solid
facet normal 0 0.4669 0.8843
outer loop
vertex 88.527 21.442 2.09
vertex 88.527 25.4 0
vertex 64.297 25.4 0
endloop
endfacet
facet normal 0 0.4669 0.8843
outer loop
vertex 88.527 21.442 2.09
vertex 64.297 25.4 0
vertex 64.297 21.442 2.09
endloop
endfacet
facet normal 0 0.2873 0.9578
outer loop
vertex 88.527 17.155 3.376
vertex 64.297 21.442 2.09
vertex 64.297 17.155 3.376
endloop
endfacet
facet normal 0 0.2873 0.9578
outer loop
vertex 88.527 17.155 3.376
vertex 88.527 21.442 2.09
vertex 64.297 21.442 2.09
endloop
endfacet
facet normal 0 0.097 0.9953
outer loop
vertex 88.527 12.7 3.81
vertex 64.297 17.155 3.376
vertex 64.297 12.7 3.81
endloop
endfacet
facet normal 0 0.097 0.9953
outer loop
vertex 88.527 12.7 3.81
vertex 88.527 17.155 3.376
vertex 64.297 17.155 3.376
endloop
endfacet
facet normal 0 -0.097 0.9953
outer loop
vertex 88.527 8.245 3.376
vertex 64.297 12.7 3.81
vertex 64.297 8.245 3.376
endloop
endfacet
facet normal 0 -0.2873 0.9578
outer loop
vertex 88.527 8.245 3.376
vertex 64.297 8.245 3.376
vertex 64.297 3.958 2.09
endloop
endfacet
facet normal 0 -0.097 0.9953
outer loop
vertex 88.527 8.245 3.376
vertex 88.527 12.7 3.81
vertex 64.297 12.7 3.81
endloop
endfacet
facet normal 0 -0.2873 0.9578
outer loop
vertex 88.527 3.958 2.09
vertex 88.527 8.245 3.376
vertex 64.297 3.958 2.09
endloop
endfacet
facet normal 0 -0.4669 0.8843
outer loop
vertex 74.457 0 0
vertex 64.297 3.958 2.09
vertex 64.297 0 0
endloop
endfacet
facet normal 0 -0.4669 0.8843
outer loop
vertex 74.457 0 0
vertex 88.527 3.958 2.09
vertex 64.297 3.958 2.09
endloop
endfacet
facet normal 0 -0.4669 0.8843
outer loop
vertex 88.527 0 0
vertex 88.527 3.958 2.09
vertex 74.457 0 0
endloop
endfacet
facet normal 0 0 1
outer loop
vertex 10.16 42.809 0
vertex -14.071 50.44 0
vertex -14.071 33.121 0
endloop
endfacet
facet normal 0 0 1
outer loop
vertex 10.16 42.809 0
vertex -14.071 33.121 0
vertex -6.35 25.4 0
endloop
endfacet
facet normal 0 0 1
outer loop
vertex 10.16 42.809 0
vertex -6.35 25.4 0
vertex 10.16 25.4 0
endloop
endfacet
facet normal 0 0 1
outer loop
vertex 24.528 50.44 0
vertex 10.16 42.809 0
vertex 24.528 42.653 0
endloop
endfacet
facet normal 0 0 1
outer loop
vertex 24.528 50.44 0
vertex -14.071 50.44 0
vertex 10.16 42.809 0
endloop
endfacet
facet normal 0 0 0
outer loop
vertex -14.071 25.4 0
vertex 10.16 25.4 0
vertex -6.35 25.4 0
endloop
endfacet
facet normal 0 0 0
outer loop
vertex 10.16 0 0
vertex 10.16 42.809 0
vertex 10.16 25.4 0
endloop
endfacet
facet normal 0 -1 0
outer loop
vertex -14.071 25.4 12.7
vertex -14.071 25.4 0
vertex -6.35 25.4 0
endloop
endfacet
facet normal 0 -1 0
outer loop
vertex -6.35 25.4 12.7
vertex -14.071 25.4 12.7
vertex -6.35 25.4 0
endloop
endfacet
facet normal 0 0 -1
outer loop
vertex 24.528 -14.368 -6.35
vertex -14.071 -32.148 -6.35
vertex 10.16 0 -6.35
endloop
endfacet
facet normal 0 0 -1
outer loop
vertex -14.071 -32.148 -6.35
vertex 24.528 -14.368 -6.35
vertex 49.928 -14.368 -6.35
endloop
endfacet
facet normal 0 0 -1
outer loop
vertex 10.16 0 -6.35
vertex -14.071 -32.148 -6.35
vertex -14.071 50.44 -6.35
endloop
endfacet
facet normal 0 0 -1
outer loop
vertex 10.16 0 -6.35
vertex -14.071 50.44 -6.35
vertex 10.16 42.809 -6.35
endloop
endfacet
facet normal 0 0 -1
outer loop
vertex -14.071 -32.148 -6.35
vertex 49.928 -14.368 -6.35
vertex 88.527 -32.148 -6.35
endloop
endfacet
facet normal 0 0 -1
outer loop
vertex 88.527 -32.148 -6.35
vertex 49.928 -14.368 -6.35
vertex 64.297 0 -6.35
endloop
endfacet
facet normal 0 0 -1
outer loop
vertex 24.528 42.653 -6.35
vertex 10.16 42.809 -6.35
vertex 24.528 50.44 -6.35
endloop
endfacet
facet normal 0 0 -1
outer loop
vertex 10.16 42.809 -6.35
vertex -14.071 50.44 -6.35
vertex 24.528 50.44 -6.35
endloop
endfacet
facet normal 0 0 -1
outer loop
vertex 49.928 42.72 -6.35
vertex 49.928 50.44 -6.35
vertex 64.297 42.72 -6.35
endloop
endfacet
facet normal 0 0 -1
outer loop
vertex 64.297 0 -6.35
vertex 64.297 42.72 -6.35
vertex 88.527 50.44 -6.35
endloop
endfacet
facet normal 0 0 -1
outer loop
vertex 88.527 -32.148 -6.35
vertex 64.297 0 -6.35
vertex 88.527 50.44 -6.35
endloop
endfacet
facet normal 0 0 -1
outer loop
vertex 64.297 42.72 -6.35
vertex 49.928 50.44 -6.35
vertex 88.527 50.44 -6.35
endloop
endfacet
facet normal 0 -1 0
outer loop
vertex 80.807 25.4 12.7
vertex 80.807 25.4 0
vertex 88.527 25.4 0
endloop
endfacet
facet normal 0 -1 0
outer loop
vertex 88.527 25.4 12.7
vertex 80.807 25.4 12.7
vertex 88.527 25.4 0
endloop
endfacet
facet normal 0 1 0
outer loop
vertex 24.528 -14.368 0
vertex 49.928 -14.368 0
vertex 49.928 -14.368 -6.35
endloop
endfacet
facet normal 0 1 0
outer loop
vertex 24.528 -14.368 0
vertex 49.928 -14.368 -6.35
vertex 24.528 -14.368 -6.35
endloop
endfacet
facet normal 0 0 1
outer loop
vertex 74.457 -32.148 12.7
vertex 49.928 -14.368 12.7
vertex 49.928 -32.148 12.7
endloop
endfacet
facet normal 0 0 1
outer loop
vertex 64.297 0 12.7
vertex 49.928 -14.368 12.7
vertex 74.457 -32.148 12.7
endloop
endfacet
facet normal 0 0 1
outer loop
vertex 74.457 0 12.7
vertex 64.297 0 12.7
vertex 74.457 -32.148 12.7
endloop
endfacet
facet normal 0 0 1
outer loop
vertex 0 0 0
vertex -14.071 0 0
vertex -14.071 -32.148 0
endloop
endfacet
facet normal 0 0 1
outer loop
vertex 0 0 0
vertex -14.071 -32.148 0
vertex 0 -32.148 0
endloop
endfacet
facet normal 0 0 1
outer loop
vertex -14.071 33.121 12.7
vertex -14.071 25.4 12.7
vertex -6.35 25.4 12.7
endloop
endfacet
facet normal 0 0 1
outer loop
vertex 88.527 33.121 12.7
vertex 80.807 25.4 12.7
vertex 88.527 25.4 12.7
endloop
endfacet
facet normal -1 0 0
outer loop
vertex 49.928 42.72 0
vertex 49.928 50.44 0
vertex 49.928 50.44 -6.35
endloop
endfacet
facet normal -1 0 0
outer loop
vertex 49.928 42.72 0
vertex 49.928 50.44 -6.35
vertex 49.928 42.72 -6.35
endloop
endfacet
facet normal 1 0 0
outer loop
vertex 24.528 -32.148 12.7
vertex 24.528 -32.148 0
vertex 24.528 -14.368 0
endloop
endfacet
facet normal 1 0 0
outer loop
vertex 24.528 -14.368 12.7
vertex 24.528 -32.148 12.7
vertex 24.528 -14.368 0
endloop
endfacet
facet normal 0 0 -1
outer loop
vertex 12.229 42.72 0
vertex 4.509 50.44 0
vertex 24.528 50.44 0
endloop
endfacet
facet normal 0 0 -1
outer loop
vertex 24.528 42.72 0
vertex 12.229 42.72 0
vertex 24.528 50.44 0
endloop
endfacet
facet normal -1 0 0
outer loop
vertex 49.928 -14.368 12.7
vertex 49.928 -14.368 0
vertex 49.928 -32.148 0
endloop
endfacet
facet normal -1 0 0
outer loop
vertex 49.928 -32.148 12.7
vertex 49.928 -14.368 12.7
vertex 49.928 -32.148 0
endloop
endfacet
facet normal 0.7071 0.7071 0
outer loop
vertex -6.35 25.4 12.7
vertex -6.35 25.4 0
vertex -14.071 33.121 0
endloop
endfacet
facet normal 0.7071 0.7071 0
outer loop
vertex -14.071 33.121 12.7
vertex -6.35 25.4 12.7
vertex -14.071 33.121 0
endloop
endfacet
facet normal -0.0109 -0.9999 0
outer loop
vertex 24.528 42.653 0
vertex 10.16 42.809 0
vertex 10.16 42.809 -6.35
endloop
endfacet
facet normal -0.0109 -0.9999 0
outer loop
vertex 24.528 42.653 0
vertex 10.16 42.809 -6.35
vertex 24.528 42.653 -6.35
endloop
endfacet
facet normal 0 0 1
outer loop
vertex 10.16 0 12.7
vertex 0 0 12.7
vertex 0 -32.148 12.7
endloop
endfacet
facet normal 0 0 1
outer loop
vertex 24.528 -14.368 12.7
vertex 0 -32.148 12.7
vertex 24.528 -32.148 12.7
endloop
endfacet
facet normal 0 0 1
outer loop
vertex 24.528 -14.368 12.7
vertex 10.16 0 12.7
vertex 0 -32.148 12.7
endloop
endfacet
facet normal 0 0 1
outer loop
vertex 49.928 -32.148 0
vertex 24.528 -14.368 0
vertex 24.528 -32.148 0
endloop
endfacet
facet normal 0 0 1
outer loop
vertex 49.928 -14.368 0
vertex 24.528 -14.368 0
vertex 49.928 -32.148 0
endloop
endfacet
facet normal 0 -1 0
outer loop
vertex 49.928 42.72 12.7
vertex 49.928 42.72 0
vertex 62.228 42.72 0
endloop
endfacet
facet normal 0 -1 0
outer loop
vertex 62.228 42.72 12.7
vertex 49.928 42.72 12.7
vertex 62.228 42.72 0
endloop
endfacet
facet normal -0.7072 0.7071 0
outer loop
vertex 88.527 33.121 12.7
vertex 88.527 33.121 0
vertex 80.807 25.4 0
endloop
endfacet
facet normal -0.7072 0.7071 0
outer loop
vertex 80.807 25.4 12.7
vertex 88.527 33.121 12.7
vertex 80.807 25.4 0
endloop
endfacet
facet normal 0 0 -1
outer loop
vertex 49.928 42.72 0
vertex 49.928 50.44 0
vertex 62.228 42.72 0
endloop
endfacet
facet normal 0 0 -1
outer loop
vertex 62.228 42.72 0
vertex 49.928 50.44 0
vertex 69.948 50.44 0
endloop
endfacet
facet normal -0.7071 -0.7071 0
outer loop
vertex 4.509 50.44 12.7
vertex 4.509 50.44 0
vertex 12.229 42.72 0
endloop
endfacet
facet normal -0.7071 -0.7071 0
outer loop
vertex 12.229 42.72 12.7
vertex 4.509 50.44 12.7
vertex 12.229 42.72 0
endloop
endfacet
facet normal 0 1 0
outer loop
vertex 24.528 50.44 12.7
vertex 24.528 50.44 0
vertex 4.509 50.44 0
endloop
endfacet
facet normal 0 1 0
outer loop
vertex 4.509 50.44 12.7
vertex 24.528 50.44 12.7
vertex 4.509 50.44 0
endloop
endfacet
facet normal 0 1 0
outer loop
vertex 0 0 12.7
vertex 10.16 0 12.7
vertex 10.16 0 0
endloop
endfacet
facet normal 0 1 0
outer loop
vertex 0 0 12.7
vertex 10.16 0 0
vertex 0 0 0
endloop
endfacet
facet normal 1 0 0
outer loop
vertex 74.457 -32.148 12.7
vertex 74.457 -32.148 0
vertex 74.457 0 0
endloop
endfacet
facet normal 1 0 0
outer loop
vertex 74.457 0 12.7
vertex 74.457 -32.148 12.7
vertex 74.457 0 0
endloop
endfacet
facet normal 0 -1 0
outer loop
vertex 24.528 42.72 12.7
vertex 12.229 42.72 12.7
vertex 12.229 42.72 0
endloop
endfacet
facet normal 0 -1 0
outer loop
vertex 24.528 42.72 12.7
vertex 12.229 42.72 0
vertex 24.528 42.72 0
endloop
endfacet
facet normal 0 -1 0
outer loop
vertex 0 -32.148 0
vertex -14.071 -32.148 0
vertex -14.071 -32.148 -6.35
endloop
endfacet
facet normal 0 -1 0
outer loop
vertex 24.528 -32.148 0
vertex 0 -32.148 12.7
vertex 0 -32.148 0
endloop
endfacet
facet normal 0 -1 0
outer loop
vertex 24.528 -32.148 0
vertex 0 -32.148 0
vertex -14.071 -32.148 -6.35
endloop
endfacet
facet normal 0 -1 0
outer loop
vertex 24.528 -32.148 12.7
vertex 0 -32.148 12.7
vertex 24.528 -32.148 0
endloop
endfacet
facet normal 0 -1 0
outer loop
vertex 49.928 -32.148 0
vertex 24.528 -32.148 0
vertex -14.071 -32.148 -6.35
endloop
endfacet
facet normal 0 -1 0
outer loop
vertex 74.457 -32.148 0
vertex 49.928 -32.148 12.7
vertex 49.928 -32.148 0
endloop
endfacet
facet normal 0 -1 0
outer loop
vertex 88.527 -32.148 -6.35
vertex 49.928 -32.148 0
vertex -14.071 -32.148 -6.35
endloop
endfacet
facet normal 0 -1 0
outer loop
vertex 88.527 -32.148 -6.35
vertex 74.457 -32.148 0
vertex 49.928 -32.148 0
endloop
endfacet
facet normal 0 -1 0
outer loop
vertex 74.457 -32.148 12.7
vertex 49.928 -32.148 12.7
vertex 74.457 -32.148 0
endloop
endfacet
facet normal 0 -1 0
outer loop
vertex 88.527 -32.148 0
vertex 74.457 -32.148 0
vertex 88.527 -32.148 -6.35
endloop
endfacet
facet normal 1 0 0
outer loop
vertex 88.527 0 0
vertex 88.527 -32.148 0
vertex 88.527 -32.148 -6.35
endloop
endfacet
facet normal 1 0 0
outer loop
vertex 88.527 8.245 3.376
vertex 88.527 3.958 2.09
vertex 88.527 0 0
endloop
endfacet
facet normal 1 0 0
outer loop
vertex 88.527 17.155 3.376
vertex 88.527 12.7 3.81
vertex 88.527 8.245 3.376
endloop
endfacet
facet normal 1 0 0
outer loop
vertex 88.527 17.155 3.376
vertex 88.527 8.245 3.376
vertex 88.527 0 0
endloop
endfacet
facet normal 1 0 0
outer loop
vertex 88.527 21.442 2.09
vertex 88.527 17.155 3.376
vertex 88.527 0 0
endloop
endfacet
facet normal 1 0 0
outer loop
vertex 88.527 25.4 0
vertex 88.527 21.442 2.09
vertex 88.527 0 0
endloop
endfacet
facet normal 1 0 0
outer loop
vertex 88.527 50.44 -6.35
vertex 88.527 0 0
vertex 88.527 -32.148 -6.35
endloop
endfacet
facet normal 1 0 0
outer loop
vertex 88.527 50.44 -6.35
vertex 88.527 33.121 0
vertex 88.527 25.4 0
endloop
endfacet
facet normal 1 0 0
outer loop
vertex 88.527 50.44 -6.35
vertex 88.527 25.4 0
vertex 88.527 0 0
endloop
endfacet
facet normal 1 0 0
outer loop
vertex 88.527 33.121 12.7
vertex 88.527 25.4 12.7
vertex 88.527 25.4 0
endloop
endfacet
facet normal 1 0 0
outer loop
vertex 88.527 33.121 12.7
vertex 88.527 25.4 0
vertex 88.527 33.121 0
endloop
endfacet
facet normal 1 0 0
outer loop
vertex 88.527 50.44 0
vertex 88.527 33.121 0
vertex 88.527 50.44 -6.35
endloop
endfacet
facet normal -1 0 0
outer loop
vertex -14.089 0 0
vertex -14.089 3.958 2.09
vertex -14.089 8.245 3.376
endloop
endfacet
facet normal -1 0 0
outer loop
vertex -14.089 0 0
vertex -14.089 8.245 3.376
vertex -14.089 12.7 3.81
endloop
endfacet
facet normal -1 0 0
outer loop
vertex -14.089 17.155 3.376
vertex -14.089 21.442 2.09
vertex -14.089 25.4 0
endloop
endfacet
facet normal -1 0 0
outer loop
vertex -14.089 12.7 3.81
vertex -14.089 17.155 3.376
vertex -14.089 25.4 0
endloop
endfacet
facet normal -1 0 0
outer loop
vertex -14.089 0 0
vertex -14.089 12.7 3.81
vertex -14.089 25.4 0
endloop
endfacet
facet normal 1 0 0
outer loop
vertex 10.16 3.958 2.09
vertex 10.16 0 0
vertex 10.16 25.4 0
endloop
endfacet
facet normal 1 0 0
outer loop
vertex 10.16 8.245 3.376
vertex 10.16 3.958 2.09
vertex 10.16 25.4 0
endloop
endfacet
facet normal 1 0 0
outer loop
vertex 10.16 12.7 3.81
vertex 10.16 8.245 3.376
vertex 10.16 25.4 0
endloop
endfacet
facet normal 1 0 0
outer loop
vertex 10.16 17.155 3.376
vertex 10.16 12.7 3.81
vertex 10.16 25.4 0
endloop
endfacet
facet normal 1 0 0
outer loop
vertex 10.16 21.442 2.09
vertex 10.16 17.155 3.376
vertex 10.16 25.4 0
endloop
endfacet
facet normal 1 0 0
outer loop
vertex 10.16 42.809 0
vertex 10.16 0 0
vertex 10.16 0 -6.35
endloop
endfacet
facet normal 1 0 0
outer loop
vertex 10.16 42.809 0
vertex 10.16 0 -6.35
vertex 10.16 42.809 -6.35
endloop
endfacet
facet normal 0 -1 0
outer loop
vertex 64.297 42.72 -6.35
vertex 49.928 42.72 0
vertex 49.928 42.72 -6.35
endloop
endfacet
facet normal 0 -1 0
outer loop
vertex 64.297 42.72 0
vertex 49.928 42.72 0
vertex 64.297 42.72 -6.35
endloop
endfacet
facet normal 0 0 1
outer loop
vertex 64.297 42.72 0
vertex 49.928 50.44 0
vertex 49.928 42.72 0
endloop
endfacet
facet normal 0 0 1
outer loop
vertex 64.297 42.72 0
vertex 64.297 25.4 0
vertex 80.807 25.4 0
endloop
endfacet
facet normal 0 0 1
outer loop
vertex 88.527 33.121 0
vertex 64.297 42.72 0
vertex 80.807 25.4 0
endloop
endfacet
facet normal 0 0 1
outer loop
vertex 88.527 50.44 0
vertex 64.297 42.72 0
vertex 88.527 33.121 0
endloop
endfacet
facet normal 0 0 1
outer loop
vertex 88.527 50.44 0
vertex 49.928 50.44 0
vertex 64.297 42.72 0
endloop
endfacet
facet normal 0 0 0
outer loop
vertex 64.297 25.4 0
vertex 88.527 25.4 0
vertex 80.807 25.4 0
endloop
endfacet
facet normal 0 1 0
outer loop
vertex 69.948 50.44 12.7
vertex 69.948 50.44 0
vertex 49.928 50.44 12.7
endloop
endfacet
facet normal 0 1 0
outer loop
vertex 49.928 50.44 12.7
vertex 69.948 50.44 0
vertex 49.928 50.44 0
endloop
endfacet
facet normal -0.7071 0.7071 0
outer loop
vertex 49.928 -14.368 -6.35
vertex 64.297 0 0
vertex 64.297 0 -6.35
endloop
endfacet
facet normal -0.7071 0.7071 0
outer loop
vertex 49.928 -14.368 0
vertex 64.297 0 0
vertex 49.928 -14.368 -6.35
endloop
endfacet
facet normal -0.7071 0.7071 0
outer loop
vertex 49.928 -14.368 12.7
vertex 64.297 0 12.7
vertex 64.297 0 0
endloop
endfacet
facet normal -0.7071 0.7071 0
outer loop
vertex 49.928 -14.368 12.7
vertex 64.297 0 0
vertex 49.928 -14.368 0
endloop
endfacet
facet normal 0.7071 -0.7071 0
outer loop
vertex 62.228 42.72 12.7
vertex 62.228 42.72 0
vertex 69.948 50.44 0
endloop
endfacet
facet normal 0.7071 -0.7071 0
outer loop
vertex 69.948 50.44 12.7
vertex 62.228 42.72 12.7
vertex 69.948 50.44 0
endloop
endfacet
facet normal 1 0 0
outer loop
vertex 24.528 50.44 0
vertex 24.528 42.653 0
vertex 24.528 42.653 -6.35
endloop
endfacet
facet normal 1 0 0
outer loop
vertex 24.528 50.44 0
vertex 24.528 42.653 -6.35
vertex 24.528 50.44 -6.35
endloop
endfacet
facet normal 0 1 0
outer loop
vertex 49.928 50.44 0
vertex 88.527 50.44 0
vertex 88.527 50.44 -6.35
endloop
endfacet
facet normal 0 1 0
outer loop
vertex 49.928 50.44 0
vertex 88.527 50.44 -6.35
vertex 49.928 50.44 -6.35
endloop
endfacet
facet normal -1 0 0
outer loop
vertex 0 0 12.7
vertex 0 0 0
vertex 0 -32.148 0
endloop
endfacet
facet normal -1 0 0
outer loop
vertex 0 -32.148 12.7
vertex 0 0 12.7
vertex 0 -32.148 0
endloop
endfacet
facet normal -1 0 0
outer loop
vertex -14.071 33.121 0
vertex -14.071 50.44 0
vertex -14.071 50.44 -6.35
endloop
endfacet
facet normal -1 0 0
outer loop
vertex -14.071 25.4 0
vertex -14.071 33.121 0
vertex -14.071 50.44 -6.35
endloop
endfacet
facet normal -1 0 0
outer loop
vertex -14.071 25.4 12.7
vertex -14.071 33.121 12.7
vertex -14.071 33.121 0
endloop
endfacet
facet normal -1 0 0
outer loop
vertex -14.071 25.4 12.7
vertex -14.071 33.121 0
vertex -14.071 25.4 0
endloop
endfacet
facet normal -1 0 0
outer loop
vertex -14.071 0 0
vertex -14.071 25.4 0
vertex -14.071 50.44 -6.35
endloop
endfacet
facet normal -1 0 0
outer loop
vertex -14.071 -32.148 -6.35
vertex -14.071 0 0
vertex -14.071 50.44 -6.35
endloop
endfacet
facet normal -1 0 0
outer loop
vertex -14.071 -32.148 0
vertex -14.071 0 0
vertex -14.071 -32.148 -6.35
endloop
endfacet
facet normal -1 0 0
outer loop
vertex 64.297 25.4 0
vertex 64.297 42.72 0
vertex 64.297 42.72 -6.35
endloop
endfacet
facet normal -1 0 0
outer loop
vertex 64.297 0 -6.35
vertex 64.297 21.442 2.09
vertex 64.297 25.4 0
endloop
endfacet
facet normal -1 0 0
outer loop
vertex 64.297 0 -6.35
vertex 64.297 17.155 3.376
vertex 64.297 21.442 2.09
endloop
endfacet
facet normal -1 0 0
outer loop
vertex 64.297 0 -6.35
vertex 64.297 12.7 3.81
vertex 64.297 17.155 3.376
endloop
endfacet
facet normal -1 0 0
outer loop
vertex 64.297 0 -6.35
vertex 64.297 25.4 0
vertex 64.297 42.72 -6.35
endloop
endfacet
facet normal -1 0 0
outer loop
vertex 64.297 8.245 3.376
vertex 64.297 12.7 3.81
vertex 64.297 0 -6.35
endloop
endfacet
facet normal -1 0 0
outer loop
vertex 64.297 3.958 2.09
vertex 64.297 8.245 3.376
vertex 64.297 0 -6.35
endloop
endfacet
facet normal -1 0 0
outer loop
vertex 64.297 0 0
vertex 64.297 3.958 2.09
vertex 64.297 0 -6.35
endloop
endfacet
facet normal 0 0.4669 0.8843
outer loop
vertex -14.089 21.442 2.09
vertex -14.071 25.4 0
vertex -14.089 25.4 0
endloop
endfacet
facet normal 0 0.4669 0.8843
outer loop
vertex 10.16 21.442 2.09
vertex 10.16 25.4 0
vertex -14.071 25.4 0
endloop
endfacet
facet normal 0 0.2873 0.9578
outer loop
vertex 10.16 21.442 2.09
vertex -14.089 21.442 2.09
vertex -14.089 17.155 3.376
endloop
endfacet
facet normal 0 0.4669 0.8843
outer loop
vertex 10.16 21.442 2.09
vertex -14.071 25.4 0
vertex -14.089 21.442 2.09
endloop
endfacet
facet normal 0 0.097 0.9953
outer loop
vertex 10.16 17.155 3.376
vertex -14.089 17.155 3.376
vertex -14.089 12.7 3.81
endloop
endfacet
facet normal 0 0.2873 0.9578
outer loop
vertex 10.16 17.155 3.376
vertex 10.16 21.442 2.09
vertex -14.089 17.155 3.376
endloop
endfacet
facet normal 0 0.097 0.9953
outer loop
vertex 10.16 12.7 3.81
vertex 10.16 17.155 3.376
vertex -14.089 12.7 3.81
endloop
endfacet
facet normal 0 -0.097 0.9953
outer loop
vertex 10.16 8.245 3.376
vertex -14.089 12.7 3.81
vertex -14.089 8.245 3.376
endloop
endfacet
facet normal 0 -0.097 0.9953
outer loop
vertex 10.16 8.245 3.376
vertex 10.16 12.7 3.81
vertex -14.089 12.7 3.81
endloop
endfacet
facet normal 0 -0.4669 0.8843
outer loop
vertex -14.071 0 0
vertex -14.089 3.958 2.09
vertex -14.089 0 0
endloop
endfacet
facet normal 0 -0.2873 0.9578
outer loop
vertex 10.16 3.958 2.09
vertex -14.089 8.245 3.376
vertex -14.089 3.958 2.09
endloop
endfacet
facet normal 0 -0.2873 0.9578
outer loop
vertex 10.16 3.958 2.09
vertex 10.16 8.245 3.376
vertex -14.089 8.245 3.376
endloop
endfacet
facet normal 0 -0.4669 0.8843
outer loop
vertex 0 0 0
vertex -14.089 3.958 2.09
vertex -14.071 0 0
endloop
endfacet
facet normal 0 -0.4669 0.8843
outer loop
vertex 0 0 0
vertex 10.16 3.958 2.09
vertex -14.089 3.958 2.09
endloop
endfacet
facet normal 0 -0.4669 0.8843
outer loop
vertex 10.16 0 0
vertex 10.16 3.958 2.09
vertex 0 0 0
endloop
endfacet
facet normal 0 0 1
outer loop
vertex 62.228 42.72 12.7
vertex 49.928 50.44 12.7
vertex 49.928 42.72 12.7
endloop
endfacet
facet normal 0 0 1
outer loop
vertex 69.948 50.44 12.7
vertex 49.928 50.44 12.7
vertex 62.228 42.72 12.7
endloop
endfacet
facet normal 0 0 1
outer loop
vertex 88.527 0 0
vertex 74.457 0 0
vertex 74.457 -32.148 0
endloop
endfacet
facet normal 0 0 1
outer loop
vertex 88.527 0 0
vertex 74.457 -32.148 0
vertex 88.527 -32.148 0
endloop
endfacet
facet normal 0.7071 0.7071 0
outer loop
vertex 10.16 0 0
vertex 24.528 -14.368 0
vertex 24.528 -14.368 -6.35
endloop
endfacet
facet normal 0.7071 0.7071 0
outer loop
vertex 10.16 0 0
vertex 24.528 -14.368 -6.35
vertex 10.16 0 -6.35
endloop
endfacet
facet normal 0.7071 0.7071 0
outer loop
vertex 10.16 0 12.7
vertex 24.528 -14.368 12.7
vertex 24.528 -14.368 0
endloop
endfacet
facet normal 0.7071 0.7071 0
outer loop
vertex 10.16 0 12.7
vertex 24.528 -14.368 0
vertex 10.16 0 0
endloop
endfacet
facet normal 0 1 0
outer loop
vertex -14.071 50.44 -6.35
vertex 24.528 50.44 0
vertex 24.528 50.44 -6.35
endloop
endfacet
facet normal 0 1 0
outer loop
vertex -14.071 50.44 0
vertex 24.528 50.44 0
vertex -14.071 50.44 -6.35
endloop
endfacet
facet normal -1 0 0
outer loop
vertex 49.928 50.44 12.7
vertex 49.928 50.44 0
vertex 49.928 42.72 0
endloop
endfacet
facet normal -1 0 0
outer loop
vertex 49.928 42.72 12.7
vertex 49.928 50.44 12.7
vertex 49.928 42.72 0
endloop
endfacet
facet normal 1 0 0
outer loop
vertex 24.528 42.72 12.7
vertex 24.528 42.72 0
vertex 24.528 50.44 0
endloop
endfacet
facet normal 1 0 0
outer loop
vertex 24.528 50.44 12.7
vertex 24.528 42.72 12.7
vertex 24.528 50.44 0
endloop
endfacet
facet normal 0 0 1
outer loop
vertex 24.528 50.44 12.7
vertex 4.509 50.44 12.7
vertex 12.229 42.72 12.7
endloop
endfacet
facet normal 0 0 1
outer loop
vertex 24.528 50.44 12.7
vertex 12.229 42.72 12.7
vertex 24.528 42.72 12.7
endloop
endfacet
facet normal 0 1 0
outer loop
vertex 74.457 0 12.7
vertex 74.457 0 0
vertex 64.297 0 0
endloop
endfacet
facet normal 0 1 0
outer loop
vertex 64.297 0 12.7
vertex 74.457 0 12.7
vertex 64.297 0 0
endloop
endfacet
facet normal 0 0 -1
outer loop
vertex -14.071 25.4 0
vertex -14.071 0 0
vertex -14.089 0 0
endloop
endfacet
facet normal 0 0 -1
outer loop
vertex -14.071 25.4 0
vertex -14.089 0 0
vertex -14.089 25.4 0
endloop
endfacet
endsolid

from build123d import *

# Parameters (mm, degrees)
F1_DEPTH = 12.7
F3_DEPTH = 6.35
F5_DEPTH = 102.616
F6_W     = 54.1368234
F6_H     = 25.3999995561
F7_DEPTH = 6.35


with BuildPart() as f1:
    # F0 (on Top) → F1 (new body)
    with BuildSketch(Plane.XY):
        Polygon((10.16, 0), (0, 0), (0, -32.1484097937), (24.5284097937, -32.1484097937), (24.5284097937, -14.3684097937), align=None)
    extrude(amount=F1_DEPTH)



with BuildPart() as f1b:
    # F0 (on Top) → F1, piece 2 (new body)
    with BuildSketch(Plane.XY):
        Polygon((24.5284097937, 50.4402085561), (4.5087214192, 50.4402085561), (12.2293054192, 42.7196245561), (24.5284097937, 42.7196245561), align=None)
    extrude(amount=F1_DEPTH)


with BuildPart() as f1c:
    # F0 (on Top) → F1, piece 3 (new body)
    with BuildSketch(Plane.XY):
        Polygon((49.9284097937, 42.7196245561), (62.2275137532, 42.7196245561), (69.9480977532, 50.4402085561), (49.9284097937, 50.4402085561), align=None)
    extrude(amount=F1_DEPTH)


with BuildPart() as f1d:
    # F0 (on Top) → F1, piece 4 (new body)
    with BuildSketch(Plane.XY):
        Polygon((74.4568195862, 0), (64.2968195874, 0), (49.9284097937, -14.3684097937), (49.9284097937, -32.1484097937), (74.4568195862, -32.1484097937), align=None)
    extrude(amount=F1_DEPTH)


with BuildPart() as f1e:
    # F0 (on Top) → F1, piece 5 (new body)
    with BuildSketch(Plane.XY):
        Polygon((88.5274035862, 33.120584), (80.8068195862, 25.4), (88.5274035862, 25.4), align=None)
    extrude(amount=F1_DEPTH)


with BuildPart() as f1f:
    # F0 (on Top) → F1, piece 6 (new body)
    with BuildSketch(Plane.XY):
        Polygon((-14.0705839987, 25.4), (-6.3499999987, 25.4), (-14.0705839987, 33.120584), align=None)
    extrude(amount=F1_DEPTH)


with BuildPart() as f3:
    # F2 (on Top) → F3 (new body)
    with BuildSketch(Plane.XY):
        Polygon((24.5284097937, 50.4402085561), (-14.0705839987, 50.4402085561), (-14.0705839987, -32.1484097937), (88.5274035862, -32.1484097937), (88.5274035862, 50.4402085561), (49.9284097937, 50.4402085561), (49.9284097937, 42.7196245561), (64.2968195874, 42.7196245561), (64.2968195874, 0), (49.9284097937, -14.3684097937), (24.5284097937, -14.3684097937), (10.16, 0), (10.16, 42.8089028328), (24.5284097937, 42.6528243452), align=None)
    extrude(amount=-F3_DEPTH)


with BuildPart() as f1_1:
    add(f1.part)

    add(f1d.part)  # F5 merges F1d

    add(f1e.part)  # F5 merges F1e

    add(f1f.part)  # F5 merges F1f

    add(f3.part)  # F5 merges F3
    # F4 (on face) → F5 (join)
    with BuildSketch(Plane.YZ.offset(88.5274035862)):
        with BuildLine():
            Line((0, 0), (25.3999995561, 0))
            ThreePointArc((25.3999995561, 0), (12.699999778, 3.81), (0, 0))
        make_face()
    extrude(amount=-F5_DEPTH)

    # F6 (on face) → F7 (cut)
    with BuildSketch(Plane.XY):
        with Locations((37.2284078874, 12.699999778)):
            Rectangle(F6_W, F6_H)
    extrude(amount=F7_DEPTH, mode=Mode.SUBTRACT)


solid = Compound([f1b.part, f1c.part, f1_1.part])
